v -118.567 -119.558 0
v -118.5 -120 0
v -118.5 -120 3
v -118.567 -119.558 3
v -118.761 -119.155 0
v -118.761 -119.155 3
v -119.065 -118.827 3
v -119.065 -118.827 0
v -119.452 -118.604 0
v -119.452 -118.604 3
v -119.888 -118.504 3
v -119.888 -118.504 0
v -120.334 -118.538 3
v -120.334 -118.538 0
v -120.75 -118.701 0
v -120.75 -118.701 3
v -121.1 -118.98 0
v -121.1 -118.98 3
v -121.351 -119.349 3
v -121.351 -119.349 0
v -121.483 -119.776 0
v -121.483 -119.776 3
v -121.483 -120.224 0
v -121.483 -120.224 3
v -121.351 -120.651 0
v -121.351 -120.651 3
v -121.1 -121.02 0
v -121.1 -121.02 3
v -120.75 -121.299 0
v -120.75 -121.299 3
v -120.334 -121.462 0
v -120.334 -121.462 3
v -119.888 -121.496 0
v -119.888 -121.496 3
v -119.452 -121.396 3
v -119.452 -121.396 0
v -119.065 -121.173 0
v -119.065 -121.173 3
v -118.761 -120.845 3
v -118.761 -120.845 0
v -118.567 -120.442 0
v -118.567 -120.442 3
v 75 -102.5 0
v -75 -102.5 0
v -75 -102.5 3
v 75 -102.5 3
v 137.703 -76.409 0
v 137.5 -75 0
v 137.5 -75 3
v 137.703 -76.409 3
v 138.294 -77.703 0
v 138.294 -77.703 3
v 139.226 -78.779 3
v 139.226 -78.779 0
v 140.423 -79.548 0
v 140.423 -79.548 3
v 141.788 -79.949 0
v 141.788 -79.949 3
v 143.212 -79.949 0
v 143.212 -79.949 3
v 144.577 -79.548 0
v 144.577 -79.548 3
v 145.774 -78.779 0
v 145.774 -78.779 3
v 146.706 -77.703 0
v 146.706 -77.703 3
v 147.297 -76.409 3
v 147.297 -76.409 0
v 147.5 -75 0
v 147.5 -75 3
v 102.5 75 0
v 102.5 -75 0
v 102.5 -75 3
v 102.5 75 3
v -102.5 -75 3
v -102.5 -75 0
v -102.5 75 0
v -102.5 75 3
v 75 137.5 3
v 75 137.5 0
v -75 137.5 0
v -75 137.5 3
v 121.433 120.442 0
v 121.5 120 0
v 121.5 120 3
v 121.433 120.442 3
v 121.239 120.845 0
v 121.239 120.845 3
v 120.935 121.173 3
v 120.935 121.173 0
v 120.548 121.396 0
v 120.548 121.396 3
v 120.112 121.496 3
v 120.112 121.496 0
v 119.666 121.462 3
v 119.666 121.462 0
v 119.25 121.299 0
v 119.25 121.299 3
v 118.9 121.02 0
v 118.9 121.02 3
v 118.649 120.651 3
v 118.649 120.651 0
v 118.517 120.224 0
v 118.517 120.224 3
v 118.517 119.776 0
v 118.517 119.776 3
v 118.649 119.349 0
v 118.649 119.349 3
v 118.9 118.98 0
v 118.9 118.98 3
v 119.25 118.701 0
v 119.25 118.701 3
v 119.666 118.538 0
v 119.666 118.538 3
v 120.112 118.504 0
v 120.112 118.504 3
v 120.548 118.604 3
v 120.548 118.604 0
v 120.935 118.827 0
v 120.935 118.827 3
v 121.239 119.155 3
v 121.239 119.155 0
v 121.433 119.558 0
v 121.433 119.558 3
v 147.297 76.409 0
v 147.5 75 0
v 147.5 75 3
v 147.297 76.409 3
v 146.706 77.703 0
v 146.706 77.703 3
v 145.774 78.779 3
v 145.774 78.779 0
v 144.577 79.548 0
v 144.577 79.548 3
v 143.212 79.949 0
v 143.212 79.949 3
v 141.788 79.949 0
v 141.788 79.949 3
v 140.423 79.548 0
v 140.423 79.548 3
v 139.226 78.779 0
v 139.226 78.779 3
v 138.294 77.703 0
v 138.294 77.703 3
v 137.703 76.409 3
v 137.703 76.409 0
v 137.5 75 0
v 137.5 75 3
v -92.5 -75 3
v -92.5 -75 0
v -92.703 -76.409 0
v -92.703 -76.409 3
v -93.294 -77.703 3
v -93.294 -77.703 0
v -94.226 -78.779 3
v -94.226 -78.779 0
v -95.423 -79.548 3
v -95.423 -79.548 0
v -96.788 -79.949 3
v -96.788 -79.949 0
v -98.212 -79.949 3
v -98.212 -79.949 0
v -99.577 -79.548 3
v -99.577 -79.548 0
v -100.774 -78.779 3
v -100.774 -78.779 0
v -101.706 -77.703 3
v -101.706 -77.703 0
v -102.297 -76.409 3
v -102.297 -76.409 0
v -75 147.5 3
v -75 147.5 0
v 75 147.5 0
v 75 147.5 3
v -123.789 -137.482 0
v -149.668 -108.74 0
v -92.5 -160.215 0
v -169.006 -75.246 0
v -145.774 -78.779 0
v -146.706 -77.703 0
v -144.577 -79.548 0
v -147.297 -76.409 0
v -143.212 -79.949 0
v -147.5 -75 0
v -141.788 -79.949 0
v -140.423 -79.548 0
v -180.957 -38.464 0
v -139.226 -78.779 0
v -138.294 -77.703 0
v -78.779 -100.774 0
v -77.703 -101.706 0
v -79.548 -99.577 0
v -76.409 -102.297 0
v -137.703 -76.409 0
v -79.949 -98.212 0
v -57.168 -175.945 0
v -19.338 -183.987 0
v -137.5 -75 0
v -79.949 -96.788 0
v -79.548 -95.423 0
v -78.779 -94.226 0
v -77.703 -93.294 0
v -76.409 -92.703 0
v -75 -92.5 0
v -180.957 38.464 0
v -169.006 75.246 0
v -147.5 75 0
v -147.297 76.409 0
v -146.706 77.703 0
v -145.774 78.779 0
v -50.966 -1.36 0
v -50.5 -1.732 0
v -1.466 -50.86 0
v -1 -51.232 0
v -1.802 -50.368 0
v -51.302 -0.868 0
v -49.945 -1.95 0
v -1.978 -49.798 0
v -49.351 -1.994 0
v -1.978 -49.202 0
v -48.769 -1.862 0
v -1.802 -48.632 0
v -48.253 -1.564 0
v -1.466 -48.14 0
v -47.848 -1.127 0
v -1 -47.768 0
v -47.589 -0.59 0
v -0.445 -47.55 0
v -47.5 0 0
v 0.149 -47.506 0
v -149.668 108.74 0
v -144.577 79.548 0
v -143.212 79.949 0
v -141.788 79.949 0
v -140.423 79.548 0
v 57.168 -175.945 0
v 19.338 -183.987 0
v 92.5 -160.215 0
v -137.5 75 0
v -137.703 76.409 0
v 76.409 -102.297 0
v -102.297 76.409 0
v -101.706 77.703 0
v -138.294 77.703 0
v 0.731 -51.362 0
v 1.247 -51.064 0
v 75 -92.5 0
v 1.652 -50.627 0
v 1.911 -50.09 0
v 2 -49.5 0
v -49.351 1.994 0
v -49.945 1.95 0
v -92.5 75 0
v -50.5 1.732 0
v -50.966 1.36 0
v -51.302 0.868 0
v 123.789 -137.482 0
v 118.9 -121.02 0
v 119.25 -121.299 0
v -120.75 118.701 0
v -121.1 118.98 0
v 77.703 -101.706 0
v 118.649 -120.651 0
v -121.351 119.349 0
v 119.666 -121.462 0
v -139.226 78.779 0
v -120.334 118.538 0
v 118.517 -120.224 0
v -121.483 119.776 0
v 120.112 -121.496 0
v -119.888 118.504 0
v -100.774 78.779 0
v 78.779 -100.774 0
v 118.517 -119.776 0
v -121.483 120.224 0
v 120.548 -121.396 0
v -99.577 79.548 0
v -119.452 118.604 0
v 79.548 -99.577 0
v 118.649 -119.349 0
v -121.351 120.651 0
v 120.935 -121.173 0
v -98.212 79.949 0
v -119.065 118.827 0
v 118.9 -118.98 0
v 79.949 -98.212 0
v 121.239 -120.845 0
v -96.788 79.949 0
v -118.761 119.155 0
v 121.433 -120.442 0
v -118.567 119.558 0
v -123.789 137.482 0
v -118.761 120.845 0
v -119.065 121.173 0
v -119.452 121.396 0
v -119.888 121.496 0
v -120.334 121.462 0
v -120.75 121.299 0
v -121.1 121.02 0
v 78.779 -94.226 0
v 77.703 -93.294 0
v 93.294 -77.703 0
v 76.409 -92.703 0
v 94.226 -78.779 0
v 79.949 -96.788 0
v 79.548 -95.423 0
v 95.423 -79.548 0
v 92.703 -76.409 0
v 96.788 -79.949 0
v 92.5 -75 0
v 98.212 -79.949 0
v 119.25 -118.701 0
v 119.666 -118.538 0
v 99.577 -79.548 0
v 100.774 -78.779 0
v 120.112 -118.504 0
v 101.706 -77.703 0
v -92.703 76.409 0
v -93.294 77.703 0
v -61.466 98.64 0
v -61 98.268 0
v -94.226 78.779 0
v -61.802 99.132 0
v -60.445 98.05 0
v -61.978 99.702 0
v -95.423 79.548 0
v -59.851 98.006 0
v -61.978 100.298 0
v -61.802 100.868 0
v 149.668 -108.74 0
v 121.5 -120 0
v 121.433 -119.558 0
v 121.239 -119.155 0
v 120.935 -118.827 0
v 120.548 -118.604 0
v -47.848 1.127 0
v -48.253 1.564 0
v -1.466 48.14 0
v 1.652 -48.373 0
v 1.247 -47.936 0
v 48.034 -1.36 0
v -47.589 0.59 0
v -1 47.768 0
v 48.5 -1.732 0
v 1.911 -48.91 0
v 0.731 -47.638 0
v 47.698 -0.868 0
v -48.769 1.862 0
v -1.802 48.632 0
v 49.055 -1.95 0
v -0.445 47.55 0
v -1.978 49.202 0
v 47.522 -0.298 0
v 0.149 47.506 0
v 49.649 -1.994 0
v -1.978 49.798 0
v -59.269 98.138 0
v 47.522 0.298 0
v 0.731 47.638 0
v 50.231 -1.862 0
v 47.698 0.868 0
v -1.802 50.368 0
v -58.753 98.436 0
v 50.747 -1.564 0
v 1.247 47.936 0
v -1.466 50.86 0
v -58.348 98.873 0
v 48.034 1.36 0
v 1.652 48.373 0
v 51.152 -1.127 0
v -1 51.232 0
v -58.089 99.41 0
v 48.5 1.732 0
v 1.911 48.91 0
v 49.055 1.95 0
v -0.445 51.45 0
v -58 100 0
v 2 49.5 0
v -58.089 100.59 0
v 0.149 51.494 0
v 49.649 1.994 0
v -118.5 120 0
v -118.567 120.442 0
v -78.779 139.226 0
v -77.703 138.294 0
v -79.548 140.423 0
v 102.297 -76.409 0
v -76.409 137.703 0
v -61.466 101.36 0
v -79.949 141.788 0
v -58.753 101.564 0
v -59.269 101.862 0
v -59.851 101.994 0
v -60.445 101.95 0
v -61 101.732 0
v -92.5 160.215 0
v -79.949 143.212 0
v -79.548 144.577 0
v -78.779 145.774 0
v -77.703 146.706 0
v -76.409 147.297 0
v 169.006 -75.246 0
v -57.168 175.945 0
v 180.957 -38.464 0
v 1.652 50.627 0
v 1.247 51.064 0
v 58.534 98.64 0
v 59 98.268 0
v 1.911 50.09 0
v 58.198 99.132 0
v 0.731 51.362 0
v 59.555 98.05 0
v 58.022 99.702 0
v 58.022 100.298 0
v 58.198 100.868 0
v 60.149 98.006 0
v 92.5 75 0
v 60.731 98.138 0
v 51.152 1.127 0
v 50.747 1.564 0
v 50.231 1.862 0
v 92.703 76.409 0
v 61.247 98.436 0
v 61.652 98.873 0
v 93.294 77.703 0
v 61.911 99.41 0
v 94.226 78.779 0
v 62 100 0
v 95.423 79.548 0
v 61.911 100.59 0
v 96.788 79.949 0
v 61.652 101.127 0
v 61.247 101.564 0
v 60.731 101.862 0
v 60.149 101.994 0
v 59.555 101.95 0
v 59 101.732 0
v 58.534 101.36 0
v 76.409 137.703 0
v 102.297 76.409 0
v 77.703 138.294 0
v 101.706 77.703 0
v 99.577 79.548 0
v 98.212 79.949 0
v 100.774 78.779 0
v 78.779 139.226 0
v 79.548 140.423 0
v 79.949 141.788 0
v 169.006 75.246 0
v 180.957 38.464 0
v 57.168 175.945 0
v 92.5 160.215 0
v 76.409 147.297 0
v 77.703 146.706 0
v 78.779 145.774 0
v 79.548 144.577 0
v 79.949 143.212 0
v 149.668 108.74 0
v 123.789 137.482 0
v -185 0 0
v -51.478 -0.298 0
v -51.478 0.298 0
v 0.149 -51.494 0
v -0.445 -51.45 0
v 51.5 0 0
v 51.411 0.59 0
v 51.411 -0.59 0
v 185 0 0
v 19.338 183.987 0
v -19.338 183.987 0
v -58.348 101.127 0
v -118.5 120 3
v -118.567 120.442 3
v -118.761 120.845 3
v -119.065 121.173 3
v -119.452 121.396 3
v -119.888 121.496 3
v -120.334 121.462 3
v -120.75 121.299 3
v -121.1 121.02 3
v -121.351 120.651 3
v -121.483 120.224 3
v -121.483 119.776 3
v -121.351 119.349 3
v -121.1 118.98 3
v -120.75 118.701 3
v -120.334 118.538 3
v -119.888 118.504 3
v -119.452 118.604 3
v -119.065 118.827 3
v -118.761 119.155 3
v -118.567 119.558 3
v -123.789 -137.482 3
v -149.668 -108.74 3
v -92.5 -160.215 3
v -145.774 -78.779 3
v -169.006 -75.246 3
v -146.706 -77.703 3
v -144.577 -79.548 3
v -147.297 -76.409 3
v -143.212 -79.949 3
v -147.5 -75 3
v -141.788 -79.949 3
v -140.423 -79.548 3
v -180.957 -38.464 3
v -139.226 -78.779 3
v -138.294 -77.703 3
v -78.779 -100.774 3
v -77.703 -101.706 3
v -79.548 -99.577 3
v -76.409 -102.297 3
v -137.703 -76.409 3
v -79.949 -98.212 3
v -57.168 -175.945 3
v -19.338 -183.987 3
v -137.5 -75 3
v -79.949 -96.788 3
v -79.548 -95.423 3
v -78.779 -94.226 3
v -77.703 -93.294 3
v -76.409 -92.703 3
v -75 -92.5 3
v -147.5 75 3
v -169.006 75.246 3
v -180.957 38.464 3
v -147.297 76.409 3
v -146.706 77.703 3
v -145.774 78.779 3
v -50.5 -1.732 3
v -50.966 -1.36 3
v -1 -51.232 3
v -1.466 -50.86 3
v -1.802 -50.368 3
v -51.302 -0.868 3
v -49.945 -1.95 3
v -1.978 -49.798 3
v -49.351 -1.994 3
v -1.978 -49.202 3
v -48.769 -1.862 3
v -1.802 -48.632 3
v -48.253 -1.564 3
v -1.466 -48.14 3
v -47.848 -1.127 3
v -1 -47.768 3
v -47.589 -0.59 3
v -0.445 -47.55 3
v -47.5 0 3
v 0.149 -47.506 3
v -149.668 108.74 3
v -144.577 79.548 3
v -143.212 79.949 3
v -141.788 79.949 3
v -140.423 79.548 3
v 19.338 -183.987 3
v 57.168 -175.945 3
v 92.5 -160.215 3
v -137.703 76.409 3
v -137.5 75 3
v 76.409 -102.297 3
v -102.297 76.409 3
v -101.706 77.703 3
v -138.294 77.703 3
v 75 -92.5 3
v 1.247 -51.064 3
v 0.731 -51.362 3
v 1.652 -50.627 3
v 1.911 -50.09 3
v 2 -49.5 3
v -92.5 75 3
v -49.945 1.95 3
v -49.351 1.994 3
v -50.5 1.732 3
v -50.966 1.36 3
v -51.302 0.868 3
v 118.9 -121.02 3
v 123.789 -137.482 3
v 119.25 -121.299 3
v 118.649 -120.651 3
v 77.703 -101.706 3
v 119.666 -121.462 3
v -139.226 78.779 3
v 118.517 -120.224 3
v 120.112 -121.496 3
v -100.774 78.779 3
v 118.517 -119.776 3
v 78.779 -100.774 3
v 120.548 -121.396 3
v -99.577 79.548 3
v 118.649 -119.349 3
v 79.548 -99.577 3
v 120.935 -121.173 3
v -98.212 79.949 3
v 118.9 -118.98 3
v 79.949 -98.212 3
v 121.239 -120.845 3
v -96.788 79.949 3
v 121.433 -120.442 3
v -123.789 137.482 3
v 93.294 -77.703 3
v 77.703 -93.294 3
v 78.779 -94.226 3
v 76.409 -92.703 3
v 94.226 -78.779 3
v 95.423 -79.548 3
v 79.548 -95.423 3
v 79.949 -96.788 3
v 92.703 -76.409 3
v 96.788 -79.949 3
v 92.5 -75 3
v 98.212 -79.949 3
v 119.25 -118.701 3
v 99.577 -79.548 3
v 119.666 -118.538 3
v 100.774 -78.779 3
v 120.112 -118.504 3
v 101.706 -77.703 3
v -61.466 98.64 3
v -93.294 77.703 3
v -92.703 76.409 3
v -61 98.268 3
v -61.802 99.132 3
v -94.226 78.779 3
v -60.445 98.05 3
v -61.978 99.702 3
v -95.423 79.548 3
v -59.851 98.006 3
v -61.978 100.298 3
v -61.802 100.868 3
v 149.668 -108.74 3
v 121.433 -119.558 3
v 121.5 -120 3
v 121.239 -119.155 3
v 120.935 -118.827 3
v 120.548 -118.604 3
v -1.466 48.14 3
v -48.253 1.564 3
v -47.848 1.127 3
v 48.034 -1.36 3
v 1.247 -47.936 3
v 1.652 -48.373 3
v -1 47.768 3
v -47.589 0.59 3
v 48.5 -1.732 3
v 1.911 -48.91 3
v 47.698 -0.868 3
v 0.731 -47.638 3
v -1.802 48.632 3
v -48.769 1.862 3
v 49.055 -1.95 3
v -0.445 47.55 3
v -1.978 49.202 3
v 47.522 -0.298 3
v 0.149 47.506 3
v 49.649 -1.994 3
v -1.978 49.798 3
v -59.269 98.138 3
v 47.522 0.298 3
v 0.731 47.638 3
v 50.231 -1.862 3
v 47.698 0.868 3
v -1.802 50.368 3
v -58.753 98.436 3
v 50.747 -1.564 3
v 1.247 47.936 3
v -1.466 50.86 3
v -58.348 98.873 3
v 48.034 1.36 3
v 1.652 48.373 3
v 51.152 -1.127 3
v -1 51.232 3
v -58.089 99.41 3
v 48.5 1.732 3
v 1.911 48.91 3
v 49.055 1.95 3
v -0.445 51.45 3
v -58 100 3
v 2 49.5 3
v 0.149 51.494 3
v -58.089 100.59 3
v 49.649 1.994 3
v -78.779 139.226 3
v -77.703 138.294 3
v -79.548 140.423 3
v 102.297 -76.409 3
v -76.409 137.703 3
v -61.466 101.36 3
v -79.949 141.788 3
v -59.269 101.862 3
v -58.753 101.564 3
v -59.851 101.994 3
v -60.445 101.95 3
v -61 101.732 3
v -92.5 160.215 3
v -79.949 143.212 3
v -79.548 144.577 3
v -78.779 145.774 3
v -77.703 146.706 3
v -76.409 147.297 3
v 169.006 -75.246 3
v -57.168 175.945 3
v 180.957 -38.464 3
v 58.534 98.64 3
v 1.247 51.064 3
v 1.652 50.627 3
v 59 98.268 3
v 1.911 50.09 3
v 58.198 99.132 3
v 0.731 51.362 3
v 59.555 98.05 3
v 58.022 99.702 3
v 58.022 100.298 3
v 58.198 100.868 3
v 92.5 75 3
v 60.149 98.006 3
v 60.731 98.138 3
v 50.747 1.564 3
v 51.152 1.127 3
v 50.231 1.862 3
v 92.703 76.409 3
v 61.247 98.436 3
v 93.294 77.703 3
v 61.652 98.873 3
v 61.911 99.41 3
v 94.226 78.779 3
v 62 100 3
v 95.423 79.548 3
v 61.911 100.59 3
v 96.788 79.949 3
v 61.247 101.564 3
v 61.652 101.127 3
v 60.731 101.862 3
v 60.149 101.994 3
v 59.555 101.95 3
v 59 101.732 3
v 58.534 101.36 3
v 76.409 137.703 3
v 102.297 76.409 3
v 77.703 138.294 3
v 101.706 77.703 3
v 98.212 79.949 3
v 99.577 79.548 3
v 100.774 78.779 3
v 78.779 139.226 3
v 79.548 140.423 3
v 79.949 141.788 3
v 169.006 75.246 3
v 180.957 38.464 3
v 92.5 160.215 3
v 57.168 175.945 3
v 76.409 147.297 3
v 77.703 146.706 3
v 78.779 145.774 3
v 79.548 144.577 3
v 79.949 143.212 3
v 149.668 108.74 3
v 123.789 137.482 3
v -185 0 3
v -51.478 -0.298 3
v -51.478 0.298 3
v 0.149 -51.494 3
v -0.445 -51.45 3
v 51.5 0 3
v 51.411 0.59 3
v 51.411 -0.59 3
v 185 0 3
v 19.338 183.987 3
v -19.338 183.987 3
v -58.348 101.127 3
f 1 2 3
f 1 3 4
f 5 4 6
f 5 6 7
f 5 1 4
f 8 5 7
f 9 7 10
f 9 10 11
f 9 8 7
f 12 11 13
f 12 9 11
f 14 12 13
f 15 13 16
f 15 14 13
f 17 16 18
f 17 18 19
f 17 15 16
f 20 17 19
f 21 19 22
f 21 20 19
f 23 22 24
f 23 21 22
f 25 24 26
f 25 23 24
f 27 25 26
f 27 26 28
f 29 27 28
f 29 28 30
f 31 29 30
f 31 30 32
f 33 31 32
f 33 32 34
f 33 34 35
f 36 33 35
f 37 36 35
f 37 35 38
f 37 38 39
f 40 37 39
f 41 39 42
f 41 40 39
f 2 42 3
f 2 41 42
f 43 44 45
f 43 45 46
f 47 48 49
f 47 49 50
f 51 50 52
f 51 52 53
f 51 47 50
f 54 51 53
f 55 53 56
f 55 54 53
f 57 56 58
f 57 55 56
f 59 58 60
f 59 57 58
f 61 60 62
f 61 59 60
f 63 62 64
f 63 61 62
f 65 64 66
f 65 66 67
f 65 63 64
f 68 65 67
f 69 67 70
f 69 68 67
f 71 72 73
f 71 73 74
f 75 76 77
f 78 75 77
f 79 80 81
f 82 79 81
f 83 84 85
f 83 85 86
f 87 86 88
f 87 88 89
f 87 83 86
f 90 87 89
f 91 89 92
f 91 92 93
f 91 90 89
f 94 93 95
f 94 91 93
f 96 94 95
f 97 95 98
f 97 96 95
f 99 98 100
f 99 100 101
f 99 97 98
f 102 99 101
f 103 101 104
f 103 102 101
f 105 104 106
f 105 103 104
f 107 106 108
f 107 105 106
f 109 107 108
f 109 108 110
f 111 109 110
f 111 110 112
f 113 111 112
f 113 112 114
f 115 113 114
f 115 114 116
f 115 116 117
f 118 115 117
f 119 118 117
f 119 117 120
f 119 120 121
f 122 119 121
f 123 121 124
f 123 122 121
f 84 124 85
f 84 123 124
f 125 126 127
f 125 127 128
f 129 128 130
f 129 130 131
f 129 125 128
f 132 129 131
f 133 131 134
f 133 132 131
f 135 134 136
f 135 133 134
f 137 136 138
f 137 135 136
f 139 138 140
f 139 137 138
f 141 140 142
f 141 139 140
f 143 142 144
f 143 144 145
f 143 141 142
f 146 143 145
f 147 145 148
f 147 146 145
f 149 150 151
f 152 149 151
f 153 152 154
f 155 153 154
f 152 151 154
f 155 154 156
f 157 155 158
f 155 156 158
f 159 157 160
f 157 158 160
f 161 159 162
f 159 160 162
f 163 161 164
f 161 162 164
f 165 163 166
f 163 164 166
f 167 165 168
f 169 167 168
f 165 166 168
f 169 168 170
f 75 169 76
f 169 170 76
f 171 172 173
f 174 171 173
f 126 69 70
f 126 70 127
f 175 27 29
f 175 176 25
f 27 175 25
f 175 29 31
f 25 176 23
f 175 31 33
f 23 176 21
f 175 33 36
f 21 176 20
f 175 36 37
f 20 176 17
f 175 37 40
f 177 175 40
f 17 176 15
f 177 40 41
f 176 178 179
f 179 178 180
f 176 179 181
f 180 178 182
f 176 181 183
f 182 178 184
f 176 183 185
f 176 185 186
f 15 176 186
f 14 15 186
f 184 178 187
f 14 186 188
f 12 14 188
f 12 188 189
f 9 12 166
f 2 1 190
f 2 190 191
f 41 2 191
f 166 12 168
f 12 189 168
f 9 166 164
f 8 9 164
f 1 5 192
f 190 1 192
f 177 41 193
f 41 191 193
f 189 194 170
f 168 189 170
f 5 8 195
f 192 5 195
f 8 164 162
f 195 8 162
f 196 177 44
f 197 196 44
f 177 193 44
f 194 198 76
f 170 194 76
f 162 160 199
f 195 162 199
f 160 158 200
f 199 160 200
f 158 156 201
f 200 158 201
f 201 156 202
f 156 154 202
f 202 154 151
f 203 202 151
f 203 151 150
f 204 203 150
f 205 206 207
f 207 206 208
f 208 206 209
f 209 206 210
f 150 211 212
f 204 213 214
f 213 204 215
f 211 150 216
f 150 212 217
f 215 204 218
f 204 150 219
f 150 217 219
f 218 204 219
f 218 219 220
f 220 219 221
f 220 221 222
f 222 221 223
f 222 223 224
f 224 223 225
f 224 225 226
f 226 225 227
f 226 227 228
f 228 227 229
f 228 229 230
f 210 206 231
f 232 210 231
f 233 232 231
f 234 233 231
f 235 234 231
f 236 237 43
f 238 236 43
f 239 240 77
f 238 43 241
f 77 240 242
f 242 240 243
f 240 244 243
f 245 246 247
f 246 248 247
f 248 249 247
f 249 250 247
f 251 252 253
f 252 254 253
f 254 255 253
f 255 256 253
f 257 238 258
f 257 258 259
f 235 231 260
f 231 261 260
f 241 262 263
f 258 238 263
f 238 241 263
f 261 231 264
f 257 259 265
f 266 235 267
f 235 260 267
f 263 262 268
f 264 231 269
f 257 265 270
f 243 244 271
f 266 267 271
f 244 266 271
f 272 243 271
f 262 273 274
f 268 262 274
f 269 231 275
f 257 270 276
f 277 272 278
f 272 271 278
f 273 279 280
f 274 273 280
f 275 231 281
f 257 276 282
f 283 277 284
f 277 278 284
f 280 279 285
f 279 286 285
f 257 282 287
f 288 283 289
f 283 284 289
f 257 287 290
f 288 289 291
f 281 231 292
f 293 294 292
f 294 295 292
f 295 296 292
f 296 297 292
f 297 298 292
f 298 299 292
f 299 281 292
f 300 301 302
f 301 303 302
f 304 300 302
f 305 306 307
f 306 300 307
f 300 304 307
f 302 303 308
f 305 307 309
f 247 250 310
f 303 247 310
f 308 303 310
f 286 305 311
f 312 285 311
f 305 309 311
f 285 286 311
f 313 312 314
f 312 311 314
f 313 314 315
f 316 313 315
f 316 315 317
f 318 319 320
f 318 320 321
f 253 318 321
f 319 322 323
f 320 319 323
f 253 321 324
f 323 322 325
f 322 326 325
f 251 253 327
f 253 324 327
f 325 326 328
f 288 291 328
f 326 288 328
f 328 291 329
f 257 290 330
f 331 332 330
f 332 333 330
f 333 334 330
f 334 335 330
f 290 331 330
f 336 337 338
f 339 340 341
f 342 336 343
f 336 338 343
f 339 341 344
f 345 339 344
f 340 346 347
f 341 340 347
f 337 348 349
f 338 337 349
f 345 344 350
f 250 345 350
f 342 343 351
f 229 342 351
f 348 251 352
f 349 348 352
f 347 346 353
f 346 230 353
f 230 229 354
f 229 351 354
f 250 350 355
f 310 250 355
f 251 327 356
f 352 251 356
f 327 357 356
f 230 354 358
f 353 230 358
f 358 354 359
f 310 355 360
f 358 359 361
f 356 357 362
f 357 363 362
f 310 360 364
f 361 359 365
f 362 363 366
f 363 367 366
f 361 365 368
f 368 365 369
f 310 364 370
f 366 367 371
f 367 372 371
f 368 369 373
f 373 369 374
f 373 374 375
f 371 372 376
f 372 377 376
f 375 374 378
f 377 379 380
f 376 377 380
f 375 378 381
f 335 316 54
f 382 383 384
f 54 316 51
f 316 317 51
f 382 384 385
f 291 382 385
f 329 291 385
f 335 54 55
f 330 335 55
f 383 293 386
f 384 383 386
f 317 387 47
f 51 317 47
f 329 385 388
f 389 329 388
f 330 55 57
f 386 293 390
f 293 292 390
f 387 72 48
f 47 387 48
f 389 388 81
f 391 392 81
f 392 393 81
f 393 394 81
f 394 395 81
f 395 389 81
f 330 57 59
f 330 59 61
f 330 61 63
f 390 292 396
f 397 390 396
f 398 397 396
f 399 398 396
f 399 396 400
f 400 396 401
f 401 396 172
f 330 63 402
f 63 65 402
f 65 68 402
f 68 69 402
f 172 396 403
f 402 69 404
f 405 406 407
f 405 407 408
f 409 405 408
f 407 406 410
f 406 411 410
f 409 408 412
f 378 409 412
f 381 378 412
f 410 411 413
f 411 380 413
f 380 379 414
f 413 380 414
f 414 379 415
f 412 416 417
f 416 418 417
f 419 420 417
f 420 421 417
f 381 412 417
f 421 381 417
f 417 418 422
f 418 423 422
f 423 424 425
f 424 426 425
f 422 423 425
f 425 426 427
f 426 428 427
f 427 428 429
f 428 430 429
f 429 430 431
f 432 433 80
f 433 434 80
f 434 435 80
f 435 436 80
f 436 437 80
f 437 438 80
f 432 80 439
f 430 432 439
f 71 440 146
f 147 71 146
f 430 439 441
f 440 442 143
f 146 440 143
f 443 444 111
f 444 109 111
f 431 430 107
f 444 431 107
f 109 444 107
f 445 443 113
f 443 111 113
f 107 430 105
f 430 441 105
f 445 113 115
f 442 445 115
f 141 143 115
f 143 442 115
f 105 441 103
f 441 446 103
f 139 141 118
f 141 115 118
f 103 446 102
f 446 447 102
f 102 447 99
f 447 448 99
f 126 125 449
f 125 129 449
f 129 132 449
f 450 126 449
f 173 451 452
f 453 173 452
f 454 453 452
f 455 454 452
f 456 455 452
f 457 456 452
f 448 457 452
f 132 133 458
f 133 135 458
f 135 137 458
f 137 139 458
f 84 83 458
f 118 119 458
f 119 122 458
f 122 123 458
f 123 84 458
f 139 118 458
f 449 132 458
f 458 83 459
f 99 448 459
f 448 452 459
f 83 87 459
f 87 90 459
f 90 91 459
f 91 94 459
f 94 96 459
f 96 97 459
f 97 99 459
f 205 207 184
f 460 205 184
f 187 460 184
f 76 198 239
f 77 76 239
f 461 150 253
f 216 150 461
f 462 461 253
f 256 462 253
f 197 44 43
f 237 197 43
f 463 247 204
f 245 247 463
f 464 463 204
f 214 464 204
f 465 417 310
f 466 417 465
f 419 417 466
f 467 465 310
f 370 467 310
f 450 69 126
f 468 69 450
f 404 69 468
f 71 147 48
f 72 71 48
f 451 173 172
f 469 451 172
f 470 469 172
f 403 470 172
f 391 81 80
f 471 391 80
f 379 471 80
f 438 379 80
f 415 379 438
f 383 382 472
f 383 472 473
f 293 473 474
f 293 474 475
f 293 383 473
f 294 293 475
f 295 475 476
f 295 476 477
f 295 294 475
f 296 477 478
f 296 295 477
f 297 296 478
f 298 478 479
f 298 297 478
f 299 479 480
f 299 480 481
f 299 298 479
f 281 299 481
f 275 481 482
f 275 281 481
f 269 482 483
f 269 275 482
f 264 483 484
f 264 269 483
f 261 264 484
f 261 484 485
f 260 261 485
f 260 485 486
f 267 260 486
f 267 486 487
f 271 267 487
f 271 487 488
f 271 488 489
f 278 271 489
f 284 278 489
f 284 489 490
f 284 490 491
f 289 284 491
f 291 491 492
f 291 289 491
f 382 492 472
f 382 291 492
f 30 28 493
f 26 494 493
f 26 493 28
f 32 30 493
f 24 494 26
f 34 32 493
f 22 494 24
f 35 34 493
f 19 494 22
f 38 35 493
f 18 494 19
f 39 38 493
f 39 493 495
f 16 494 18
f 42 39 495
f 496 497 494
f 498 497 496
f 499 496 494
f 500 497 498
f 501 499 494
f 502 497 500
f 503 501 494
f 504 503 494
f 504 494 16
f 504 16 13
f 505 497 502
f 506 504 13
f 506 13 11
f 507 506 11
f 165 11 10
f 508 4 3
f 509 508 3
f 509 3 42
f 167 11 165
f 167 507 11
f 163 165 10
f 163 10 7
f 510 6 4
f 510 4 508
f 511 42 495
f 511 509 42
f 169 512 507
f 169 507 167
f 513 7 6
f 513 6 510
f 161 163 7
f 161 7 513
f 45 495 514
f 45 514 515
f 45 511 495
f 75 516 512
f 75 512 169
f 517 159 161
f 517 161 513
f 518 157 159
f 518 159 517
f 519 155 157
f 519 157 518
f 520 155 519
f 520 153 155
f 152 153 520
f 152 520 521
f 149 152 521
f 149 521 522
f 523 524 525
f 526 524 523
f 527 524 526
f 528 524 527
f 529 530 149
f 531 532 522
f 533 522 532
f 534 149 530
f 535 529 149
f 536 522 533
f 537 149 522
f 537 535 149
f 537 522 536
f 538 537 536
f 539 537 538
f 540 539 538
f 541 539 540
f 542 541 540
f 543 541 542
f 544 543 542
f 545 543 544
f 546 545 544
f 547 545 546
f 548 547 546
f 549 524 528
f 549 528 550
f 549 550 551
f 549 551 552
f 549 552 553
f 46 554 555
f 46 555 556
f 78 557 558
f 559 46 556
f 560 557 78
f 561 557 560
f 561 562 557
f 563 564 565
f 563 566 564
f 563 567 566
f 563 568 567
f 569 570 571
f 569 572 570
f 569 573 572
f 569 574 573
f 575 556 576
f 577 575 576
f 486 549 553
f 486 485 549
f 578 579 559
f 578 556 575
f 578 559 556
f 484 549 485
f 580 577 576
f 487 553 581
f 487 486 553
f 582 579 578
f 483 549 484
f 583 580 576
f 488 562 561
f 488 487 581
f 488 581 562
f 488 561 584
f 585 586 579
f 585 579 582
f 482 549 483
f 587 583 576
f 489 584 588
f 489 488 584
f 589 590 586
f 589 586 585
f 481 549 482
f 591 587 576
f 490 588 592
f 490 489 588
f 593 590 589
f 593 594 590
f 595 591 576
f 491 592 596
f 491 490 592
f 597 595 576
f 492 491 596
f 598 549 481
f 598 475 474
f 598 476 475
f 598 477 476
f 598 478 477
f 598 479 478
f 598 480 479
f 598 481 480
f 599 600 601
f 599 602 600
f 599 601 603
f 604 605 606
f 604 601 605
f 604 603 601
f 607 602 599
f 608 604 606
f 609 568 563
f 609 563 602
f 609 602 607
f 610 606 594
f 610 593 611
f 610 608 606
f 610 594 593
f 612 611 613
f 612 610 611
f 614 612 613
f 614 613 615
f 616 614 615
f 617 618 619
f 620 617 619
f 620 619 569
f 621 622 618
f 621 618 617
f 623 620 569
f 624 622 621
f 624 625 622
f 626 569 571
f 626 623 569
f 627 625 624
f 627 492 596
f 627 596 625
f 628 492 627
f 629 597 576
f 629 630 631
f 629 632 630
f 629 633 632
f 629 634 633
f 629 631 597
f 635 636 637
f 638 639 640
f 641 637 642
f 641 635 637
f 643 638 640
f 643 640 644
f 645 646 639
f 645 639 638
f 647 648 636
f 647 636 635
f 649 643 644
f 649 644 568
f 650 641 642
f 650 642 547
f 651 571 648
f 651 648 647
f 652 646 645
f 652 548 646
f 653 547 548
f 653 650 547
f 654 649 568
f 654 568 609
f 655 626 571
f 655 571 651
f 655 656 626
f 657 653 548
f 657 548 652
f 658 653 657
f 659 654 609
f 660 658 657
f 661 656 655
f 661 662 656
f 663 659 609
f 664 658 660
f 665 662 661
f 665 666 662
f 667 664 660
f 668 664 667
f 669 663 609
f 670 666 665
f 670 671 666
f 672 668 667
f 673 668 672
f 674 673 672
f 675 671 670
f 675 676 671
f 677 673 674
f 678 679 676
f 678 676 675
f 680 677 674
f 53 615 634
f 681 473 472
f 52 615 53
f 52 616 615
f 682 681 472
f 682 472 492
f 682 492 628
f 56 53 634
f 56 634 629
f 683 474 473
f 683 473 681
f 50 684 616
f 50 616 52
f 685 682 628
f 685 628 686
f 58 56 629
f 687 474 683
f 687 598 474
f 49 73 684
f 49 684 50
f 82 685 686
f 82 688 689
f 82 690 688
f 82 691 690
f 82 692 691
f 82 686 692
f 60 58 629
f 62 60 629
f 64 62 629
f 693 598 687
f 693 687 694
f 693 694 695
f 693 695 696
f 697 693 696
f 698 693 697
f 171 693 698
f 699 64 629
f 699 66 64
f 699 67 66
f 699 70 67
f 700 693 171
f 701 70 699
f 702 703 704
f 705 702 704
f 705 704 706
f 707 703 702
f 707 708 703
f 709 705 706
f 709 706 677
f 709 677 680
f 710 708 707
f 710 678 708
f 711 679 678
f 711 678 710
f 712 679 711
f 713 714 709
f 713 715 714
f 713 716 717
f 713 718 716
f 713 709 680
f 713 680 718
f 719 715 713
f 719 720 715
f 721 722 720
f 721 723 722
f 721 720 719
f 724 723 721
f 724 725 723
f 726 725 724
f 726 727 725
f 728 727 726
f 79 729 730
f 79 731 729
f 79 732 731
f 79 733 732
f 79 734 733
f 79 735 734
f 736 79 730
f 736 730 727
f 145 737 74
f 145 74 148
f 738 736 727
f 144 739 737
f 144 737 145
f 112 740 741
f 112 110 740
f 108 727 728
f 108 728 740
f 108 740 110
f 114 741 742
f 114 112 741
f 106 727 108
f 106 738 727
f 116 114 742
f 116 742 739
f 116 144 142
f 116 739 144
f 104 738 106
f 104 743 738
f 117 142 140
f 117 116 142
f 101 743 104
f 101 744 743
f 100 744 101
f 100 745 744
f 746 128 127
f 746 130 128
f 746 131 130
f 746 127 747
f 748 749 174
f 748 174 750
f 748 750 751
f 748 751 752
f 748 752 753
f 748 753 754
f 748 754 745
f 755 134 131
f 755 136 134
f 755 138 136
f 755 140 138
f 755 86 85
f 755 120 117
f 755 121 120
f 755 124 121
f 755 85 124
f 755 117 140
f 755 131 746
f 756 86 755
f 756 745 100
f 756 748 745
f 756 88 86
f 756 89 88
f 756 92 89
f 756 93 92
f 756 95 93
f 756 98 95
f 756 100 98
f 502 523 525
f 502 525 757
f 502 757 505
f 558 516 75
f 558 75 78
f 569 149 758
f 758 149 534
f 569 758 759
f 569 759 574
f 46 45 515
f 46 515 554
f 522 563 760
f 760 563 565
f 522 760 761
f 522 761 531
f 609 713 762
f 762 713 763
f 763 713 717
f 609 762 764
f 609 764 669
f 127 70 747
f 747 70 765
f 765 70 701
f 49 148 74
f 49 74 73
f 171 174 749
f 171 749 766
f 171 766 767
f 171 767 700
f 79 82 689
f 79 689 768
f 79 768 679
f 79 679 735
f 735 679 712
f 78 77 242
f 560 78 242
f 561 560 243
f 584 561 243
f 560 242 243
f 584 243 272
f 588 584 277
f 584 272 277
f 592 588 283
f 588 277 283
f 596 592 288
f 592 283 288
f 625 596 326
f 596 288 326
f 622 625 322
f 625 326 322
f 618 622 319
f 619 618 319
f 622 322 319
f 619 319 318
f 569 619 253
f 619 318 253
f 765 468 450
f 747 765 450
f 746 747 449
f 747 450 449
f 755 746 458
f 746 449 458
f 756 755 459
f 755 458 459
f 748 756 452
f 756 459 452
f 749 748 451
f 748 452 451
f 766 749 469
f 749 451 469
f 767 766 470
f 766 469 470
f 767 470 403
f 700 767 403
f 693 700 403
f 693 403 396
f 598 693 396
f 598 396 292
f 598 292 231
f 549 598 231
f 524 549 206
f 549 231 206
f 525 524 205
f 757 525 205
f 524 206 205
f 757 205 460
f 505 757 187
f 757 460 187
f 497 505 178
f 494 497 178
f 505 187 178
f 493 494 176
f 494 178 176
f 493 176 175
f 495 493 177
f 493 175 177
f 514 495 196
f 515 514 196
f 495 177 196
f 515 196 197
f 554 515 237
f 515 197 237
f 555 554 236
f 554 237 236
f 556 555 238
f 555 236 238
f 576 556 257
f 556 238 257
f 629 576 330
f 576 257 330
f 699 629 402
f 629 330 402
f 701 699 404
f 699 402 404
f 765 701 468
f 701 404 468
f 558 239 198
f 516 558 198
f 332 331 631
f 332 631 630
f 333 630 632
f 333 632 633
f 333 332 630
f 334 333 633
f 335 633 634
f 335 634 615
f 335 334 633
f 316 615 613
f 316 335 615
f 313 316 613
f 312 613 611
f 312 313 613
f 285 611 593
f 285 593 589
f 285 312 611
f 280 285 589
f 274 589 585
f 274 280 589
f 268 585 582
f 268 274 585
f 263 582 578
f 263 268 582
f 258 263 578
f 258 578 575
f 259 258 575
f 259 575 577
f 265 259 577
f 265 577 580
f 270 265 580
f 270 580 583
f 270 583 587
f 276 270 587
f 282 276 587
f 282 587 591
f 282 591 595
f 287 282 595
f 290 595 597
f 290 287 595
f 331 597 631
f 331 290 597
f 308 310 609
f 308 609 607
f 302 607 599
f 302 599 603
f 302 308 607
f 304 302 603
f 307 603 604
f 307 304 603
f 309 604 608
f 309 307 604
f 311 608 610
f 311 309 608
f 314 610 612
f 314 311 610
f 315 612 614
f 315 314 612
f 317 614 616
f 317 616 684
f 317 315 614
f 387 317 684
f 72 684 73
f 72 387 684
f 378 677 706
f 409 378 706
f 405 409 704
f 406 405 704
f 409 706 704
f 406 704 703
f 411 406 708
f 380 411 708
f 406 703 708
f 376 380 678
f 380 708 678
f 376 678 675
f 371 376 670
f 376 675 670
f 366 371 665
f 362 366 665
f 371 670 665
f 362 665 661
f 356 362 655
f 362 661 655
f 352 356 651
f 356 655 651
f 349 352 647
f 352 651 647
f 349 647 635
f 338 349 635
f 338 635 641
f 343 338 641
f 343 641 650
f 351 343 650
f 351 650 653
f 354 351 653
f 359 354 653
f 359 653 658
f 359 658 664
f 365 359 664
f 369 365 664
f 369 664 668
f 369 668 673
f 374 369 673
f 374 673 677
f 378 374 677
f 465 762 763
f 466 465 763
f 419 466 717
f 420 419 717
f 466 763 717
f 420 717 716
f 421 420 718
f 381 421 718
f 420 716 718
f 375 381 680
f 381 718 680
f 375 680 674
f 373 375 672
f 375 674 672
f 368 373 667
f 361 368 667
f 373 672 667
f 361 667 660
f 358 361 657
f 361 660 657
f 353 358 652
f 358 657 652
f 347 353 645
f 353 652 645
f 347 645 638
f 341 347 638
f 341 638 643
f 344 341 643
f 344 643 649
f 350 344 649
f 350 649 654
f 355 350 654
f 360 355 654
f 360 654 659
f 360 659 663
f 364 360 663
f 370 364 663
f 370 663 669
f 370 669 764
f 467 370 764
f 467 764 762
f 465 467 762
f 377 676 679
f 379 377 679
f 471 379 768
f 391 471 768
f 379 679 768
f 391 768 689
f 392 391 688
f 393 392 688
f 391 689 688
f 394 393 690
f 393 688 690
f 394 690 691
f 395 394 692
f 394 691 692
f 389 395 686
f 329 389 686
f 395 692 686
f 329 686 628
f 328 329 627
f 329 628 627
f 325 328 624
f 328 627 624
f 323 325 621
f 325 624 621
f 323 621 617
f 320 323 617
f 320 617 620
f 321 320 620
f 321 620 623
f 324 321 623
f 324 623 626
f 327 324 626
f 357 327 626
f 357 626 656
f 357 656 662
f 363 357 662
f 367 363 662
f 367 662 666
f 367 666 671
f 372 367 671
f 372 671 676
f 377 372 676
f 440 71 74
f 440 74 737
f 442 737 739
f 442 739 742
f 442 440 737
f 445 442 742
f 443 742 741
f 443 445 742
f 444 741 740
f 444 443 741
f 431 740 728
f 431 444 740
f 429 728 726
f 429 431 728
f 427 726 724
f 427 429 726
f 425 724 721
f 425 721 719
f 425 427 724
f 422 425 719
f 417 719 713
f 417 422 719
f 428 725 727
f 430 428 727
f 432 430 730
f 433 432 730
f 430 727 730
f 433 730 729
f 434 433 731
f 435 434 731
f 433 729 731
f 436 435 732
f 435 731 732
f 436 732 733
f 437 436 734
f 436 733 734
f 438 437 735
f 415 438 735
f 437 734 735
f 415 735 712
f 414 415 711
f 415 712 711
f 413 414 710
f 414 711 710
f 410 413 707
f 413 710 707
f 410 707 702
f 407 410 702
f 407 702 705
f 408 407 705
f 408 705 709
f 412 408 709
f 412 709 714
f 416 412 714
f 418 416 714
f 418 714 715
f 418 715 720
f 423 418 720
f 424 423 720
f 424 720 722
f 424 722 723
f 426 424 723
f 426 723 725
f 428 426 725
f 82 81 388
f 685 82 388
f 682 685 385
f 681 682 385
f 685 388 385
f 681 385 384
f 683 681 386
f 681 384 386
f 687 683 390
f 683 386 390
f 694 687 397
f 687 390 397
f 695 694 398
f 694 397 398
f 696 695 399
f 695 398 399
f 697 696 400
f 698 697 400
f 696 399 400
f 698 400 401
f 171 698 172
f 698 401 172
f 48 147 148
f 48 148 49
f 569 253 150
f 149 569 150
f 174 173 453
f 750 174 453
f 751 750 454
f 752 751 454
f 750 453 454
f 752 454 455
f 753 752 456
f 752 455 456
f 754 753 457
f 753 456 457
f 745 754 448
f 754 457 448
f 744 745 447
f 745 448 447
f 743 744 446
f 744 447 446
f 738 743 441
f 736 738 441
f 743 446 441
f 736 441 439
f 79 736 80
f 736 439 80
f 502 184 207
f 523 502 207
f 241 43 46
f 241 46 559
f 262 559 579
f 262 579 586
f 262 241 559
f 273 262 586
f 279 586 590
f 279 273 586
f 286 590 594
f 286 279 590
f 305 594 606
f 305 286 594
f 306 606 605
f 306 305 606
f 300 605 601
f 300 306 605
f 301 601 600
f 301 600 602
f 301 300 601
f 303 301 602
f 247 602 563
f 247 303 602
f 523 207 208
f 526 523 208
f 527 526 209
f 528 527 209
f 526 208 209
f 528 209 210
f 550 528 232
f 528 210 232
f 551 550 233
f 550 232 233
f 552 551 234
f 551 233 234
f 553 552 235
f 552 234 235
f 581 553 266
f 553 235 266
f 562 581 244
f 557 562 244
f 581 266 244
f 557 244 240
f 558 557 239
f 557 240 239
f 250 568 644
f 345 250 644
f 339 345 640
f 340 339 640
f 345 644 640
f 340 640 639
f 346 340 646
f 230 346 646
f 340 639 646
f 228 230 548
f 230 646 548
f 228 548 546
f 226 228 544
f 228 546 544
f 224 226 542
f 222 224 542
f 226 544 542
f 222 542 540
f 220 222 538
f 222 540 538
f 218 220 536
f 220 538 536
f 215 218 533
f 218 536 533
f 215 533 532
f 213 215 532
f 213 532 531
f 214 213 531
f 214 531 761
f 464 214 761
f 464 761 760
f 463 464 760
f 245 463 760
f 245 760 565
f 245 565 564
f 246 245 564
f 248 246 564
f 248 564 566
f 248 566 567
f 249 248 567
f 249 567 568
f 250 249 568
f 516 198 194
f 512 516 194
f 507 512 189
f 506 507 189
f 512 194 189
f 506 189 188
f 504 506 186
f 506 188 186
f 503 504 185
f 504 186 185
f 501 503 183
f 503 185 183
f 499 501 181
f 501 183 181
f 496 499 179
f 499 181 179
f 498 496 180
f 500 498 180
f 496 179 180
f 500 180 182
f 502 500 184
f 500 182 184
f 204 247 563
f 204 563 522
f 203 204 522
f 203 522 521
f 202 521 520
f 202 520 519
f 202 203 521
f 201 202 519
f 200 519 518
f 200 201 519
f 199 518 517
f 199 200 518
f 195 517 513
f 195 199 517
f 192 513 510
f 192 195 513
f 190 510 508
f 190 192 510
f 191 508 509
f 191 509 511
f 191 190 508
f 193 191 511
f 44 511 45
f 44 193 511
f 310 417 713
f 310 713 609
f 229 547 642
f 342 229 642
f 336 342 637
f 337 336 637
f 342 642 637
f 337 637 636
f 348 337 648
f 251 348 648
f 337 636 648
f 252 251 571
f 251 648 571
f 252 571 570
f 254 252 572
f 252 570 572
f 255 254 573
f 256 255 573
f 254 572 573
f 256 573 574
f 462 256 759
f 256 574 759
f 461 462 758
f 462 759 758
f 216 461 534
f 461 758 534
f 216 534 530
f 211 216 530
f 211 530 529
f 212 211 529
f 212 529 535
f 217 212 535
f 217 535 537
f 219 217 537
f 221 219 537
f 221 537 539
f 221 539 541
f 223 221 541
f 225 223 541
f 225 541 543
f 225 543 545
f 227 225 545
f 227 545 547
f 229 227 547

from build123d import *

# Parameters (mm, degrees)
SKETCH_1_R          = 185
SKETCH_1_R_2        = 1.5
EXTRUDE_1_DEPTH     = 3
SKETCH_2_R          = 2
CUT_EXTRUDE_1_DEPTH = 10


with BuildPart() as part:
    # 草图1 → 凸台-拉伸1 (new body)
    with BuildSketch(Plane.XY):
        Circle(SKETCH_1_R)
        with Locations((-120, 120)):
            Circle(SKETCH_1_R_2, mode=Mode.SUBTRACT)
        with Locations((120, 120)):
            Circle(SKETCH_1_R_2, mode=Mode.SUBTRACT)
        with Locations((120, -120)):
            Circle(SKETCH_1_R_2, mode=Mode.SUBTRACT)
        with Locations((-120, -120)):
            Circle(SKETCH_1_R_2, mode=Mode.SUBTRACT)
        with BuildLine():
            Line((-102.5, -75), (-102.5, 75))
            ThreePointArc((-102.5, 75), (-97.5, 80), (-92.5, 75))
            Line((-92.5, 75), (-92.5, -75))
            ThreePointArc((-92.5, -75), (-97.5, -80), (-102.5, -75))
        make_face(mode=Mode.SUBTRACT)
        with BuildLine():
            Line((147.5, -75), (147.5, 75))
            ThreePointArc((147.5, 75), (142.5, 80), (137.5, 75))
            Line((137.5, 75), (137.5, -75))
            ThreePointArc((137.5, -75), (142.5, -80), (147.5, -75))
        make_face(mode=Mode.SUBTRACT)
        with BuildLine():
            Line((-147.5, -75), (-147.5, 75))
            ThreePointArc((-147.5, 75), (-142.5, 80), (-137.5, 75))
            Line((-137.5, 75), (-137.5, -75))
            ThreePointArc((-137.5, -75), (-142.5, -80), (-147.5, -75))
        make_face(mode=Mode.SUBTRACT)
        with BuildLine():
            Line((-75, -102.5), (75, -102.5))
            ThreePointArc((75, -102.5), (80, -97.5), (75, -92.5))
            Line((75, -92.5), (-75, -92.5))
            ThreePointArc((-75, -92.5), (-80, -97.5), (-75, -102.5))
        make_face(mode=Mode.SUBTRACT)
        with BuildLine():
            Line((-75, 147.5), (75, 147.5))
            ThreePointArc((75, 147.5), (80, 142.5), (75, 137.5))
            Line((75, 137.5), (-75, 137.5))
            ThreePointArc((-75, 137.5), (-80, 142.5), (-75, 147.5))
        make_face(mode=Mode.SUBTRACT)
        with BuildLine():
            Line((102.5, -75), (102.5, 75))
            ThreePointArc((102.5, 75), (97.5, 80), (92.5, 75))
            Line((92.5, 75), (92.5, -75))
            ThreePointArc((92.5, -75), (97.5, -80), (102.5, -75))
        make_face(mode=Mode.SUBTRACT)
    extrude(amount=EXTRUDE_1_DEPTH)

    # 草图2 → 切除-拉伸1 (cut)
    with BuildSketch(Plane.XY.offset(3)):
        with Locations((0, 49.5)):
            Circle(SKETCH_2_R)
        with Locations((0, -49.5)):
            Circle(SKETCH_2_R)
        with Locations((49.5, 0)):
            Circle(SKETCH_2_R)
        with Locations((-49.5, 0)):
            Circle(SKETCH_2_R)
        with Locations((60, 100)):
            Circle(SKETCH_2_R)
        with Locations((-60, 100)):
            Circle(SKETCH_2_R)
    extrude(amount=-CUT_EXTRUDE_1_DEPTH, mode=Mode.SUBTRACT)


solid = part.part
